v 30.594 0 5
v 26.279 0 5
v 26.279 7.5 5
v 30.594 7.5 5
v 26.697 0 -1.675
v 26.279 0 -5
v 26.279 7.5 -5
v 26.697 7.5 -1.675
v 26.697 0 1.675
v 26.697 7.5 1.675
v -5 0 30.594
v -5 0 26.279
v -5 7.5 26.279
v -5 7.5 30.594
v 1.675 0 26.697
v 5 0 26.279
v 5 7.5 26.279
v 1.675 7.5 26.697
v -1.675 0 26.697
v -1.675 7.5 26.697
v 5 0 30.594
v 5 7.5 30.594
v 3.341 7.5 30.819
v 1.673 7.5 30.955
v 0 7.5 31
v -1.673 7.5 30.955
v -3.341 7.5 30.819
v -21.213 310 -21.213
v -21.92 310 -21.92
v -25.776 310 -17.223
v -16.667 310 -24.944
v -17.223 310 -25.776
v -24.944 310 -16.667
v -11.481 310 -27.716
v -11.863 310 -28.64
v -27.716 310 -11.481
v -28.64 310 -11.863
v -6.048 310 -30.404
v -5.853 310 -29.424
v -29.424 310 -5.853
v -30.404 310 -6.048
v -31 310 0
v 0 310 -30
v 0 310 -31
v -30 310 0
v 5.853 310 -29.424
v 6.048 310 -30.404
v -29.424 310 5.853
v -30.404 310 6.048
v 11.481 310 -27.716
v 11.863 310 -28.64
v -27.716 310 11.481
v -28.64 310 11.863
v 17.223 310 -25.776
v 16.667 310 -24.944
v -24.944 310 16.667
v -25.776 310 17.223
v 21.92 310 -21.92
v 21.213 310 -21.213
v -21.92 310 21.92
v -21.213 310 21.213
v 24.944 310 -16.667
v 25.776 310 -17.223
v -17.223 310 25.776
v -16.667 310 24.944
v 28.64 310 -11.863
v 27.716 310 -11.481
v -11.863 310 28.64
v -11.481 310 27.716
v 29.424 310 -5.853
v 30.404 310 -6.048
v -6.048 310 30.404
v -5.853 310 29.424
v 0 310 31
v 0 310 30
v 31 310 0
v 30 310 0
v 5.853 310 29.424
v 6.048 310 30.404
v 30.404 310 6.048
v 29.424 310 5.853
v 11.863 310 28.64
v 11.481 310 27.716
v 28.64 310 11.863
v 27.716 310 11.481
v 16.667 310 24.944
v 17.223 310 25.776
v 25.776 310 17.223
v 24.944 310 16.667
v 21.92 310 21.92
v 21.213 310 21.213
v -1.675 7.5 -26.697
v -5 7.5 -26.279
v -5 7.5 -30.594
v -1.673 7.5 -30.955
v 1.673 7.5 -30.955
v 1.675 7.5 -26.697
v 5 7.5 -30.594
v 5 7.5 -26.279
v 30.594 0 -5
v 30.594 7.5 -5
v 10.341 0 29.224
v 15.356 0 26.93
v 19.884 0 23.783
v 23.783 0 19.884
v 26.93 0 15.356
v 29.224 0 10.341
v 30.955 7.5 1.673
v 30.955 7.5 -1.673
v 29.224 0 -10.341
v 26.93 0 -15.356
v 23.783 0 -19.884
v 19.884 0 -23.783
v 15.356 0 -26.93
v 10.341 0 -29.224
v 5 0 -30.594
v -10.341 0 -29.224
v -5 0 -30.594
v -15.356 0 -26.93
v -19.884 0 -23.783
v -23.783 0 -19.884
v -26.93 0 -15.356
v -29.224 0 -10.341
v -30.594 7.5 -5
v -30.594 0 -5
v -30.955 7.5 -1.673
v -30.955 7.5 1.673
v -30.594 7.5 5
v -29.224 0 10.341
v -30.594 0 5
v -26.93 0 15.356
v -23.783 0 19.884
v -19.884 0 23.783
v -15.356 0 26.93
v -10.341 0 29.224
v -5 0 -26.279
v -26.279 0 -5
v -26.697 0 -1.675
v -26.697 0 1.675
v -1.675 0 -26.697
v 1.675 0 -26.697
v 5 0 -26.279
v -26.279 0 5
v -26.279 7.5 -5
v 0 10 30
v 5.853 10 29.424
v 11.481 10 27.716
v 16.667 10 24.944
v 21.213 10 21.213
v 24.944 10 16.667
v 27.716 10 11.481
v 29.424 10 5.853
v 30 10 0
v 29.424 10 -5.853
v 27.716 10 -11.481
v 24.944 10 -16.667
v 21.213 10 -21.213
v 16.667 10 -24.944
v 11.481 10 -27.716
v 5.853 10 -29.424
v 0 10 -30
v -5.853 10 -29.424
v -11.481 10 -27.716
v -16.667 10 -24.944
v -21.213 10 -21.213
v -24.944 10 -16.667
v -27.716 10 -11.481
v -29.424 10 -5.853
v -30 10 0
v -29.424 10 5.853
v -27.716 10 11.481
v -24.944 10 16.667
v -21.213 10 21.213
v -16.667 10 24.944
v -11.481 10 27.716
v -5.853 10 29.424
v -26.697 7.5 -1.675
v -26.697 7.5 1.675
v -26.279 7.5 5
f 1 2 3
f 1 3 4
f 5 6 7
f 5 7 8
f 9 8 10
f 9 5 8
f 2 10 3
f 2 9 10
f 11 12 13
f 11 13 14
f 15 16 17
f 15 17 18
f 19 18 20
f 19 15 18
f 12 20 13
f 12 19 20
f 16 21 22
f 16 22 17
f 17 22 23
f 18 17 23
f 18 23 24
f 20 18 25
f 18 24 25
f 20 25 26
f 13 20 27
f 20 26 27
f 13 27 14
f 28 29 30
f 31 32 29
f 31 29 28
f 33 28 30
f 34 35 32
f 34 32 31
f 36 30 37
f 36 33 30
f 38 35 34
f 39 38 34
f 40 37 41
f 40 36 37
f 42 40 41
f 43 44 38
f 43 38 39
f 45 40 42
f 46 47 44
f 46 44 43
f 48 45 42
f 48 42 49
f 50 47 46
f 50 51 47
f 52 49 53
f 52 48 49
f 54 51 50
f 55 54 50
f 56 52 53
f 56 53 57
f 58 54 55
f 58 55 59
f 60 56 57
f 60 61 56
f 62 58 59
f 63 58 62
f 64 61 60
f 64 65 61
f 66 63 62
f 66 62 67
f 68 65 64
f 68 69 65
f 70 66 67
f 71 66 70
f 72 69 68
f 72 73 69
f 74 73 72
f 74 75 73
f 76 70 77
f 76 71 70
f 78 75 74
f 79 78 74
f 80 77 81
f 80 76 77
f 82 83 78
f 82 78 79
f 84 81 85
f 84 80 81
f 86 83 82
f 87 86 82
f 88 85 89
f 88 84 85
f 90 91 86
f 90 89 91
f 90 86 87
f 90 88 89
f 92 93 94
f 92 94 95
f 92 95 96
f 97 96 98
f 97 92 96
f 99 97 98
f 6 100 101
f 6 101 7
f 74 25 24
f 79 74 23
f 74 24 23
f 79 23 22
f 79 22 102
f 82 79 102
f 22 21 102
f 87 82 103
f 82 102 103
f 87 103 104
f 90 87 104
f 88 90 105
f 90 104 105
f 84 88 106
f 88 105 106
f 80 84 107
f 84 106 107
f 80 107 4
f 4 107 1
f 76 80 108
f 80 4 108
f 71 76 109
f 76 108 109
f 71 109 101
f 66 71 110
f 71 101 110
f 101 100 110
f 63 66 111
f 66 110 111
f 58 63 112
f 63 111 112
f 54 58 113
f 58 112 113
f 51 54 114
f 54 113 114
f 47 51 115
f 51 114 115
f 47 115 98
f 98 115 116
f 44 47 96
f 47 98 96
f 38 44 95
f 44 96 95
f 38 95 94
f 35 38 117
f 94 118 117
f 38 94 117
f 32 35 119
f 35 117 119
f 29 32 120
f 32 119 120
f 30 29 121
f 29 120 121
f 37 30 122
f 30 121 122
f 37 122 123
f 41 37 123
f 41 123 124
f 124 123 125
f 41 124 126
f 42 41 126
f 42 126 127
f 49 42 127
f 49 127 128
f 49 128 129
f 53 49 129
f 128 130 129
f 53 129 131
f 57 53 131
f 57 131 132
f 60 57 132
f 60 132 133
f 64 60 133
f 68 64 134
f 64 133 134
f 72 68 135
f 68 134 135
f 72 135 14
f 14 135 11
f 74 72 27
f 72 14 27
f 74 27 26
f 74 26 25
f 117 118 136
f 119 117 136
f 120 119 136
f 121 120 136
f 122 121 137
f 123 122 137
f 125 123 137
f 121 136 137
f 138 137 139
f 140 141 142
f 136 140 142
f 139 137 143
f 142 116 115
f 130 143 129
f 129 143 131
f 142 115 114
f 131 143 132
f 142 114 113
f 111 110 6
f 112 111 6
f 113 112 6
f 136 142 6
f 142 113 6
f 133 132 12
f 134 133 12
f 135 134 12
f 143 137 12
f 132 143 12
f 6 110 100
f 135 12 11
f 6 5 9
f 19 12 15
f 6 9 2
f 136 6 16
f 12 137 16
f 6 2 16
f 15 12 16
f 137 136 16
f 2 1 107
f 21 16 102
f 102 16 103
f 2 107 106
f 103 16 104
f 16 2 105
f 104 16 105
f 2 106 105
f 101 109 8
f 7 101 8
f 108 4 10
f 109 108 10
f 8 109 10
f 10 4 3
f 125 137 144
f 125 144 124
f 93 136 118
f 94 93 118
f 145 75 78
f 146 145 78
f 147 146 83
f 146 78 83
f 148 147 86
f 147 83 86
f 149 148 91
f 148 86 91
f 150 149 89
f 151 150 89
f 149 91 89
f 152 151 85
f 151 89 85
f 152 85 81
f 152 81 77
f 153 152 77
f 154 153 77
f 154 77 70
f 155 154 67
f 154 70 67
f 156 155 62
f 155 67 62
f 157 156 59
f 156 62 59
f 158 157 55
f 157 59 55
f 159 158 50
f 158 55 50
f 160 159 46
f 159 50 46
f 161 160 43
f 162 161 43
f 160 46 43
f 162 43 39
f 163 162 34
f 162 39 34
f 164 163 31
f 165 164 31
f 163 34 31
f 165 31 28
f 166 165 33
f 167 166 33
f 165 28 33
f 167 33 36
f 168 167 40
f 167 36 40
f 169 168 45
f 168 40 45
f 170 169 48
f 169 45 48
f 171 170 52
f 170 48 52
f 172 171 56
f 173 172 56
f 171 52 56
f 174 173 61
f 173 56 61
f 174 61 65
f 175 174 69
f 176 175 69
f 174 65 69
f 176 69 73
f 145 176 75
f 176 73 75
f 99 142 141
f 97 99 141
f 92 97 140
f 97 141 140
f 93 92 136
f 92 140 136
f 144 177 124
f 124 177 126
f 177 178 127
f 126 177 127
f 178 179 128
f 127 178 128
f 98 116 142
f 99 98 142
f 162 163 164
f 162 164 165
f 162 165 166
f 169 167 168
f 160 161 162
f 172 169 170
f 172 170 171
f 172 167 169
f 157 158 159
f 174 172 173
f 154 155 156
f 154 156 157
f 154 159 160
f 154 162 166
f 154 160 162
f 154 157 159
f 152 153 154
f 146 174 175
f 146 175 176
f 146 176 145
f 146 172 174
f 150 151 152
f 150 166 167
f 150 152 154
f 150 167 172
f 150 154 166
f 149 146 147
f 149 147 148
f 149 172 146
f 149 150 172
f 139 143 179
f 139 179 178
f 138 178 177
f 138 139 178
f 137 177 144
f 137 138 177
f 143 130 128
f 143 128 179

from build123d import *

# Parameters (mm, degrees)
SKETCH1_R           = 31
BOSS_EXTRUDE1_DEPTH = 310
SKETCH2_R           = 30
CUT_EXTRUDE1_DEPTH  = 300
CUT_EXTRUDE2_DEPTH  = 7.5


with BuildPart() as part:
    # Sketch1 → Boss-Extrude1 (new body)
    with BuildSketch(Plane(origin=(0, 0, 0), x_dir=(1, 0, 0), z_dir=(0, 1, 0))):
        with Locations(Location((0, 0, 0), (0, 0, 270))):
            Circle(SKETCH1_R)
    extrude(amount=BOSS_EXTRUDE1_DEPTH)

    # Sketch2 → Cut-Extrude1 (cut)
    with BuildSketch(Plane(origin=(0, 310, 0), x_dir=(1, 0, 0), z_dir=(0, 1, 0))):
        with Locations(Location((0, 0, 0), (0, 0, 270))):
            Circle(SKETCH2_R)
    extrude(amount=-CUT_EXTRUDE1_DEPTH, mode=Mode.SUBTRACT)

    # Sketch3 → Cut-Extrude2 (cut)
    with BuildSketch(Plane.XZ):
        with BuildLine():
            Line((-26.278555896, -5), (-30.594117082, -5))
            ThreePointArc((-30.594117082, -5), (-31, 0), (-30.594117082, 5))
            Line((-30.594117082, 5), (-26.278555896, 5))
            ThreePointArc((-26.278555896, 5), (-26.75, 0), (-26.278555896, -5))
        make_face()
        with BuildLine():
            Line((-5, -26.278555896), (-5, -30.594117082))
            ThreePointArc((-5, -30.594117082), (0, -31), (5, -30.594117082))
            Line((5, -30.594117082), (5, -26.278555896))
            ThreePointArc((5, -26.278555896), (0, -26.75), (-5, -26.278555896))
        make_face()
        with BuildLine():
            Line((-5, 26.278555896), (-5, 30.594117082))
            ThreePointArc((-5, 30.594117082), (0, 31), (5, 30.594117082))
            Line((5, 30.594117082), (5, 26.278555896))
            ThreePointArc((5, 26.278555896), (0, 26.75), (-5, 26.278555896))
        make_face()
        with BuildLine():
            Line((26.278555896, 5), (30.594117082, 5))
            ThreePointArc((30.594117082, 5), (31, 0), (30.594117082, -5))
            Line((30.594117082, -5), (26.278555896, -5))
            ThreePointArc((26.278555896, -5), (26.75, 0), (26.278555896, 5))
        make_face()
    extrude(amount=-CUT_EXTRUDE2_DEPTH, mode=Mode.SUBTRACT)


solid = part.part
